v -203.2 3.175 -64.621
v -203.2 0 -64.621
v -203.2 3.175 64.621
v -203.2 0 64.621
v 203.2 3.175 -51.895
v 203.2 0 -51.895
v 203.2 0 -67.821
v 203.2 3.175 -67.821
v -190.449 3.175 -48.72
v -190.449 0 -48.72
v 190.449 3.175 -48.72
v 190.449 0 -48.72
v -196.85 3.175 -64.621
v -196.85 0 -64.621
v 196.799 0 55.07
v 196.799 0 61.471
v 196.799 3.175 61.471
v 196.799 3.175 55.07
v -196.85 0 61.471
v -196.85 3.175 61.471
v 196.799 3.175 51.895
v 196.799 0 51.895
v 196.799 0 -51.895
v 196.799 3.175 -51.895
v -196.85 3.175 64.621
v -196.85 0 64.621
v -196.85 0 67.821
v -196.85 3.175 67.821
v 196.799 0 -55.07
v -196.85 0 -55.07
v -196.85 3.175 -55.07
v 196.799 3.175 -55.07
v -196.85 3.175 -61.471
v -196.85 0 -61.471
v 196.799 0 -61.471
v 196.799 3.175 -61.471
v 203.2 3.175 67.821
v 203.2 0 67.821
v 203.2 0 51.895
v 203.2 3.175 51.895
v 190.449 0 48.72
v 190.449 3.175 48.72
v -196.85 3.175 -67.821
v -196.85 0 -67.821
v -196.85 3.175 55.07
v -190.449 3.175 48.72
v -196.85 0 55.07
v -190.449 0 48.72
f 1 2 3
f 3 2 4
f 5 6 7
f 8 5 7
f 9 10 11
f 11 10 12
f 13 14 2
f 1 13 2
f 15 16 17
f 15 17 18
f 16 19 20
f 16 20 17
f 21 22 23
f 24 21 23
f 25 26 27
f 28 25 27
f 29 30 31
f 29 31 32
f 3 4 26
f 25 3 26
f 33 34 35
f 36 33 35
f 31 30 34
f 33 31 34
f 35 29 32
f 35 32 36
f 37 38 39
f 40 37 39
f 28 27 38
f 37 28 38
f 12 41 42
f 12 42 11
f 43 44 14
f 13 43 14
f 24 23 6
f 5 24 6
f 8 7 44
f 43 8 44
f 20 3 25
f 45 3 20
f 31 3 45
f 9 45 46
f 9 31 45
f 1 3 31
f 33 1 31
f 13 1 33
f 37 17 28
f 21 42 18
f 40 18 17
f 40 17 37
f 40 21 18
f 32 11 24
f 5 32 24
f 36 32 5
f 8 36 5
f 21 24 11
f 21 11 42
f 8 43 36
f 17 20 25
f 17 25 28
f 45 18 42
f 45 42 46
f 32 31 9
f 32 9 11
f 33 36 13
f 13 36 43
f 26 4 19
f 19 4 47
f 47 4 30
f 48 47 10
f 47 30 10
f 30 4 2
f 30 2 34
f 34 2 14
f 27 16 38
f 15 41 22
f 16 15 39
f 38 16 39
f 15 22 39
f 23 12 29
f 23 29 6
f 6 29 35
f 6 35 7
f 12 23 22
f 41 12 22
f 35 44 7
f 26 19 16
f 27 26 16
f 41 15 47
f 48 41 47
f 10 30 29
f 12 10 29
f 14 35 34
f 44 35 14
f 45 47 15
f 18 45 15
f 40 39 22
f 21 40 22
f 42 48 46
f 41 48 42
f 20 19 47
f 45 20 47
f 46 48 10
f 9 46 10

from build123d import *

# Parameters (mm, degrees)
SKETCH1_W           = 393.6492
SKETCH1_H           = 6.4008
SKETCH1_W_2         = 380.8984
SKETCH1_H_2         = 97.44075
BOSS_EXTRUDE1_DEPTH = 3.175


with BuildPart() as part:
    # Sketch1 → Boss-Extrude1 (new body)
    with BuildSketch(Plane(origin=(0, 0, 0), x_dir=(1, 0, 0), z_dir=(0, 1, 0))):
        Polygon((-203.2, 64.620775), (-203.2, -64.620775), (-196.85, -64.620775), (-196.85, -67.821175), (203.2, -67.821175), (203.2, -51.895375), (196.7992, -51.895375), (196.7992, 51.895375), (203.2, 51.895375), (203.2, 67.821175), (-196.85, 67.821175), (-196.85, 64.620775), align=None)
        with Locations((-0.0254, 58.270775)):
            Rectangle(SKETCH1_W, SKETCH1_H, mode=Mode.SUBTRACT)
        with Locations((-0.0254, -58.270775)):
            Rectangle(SKETCH1_W, SKETCH1_H, mode=Mode.SUBTRACT)
        Rectangle(SKETCH1_W_2, SKETCH1_H_2, mode=Mode.SUBTRACT)
    extrude(amount=BOSS_EXTRUDE1_DEPTH)


solid = part.part
